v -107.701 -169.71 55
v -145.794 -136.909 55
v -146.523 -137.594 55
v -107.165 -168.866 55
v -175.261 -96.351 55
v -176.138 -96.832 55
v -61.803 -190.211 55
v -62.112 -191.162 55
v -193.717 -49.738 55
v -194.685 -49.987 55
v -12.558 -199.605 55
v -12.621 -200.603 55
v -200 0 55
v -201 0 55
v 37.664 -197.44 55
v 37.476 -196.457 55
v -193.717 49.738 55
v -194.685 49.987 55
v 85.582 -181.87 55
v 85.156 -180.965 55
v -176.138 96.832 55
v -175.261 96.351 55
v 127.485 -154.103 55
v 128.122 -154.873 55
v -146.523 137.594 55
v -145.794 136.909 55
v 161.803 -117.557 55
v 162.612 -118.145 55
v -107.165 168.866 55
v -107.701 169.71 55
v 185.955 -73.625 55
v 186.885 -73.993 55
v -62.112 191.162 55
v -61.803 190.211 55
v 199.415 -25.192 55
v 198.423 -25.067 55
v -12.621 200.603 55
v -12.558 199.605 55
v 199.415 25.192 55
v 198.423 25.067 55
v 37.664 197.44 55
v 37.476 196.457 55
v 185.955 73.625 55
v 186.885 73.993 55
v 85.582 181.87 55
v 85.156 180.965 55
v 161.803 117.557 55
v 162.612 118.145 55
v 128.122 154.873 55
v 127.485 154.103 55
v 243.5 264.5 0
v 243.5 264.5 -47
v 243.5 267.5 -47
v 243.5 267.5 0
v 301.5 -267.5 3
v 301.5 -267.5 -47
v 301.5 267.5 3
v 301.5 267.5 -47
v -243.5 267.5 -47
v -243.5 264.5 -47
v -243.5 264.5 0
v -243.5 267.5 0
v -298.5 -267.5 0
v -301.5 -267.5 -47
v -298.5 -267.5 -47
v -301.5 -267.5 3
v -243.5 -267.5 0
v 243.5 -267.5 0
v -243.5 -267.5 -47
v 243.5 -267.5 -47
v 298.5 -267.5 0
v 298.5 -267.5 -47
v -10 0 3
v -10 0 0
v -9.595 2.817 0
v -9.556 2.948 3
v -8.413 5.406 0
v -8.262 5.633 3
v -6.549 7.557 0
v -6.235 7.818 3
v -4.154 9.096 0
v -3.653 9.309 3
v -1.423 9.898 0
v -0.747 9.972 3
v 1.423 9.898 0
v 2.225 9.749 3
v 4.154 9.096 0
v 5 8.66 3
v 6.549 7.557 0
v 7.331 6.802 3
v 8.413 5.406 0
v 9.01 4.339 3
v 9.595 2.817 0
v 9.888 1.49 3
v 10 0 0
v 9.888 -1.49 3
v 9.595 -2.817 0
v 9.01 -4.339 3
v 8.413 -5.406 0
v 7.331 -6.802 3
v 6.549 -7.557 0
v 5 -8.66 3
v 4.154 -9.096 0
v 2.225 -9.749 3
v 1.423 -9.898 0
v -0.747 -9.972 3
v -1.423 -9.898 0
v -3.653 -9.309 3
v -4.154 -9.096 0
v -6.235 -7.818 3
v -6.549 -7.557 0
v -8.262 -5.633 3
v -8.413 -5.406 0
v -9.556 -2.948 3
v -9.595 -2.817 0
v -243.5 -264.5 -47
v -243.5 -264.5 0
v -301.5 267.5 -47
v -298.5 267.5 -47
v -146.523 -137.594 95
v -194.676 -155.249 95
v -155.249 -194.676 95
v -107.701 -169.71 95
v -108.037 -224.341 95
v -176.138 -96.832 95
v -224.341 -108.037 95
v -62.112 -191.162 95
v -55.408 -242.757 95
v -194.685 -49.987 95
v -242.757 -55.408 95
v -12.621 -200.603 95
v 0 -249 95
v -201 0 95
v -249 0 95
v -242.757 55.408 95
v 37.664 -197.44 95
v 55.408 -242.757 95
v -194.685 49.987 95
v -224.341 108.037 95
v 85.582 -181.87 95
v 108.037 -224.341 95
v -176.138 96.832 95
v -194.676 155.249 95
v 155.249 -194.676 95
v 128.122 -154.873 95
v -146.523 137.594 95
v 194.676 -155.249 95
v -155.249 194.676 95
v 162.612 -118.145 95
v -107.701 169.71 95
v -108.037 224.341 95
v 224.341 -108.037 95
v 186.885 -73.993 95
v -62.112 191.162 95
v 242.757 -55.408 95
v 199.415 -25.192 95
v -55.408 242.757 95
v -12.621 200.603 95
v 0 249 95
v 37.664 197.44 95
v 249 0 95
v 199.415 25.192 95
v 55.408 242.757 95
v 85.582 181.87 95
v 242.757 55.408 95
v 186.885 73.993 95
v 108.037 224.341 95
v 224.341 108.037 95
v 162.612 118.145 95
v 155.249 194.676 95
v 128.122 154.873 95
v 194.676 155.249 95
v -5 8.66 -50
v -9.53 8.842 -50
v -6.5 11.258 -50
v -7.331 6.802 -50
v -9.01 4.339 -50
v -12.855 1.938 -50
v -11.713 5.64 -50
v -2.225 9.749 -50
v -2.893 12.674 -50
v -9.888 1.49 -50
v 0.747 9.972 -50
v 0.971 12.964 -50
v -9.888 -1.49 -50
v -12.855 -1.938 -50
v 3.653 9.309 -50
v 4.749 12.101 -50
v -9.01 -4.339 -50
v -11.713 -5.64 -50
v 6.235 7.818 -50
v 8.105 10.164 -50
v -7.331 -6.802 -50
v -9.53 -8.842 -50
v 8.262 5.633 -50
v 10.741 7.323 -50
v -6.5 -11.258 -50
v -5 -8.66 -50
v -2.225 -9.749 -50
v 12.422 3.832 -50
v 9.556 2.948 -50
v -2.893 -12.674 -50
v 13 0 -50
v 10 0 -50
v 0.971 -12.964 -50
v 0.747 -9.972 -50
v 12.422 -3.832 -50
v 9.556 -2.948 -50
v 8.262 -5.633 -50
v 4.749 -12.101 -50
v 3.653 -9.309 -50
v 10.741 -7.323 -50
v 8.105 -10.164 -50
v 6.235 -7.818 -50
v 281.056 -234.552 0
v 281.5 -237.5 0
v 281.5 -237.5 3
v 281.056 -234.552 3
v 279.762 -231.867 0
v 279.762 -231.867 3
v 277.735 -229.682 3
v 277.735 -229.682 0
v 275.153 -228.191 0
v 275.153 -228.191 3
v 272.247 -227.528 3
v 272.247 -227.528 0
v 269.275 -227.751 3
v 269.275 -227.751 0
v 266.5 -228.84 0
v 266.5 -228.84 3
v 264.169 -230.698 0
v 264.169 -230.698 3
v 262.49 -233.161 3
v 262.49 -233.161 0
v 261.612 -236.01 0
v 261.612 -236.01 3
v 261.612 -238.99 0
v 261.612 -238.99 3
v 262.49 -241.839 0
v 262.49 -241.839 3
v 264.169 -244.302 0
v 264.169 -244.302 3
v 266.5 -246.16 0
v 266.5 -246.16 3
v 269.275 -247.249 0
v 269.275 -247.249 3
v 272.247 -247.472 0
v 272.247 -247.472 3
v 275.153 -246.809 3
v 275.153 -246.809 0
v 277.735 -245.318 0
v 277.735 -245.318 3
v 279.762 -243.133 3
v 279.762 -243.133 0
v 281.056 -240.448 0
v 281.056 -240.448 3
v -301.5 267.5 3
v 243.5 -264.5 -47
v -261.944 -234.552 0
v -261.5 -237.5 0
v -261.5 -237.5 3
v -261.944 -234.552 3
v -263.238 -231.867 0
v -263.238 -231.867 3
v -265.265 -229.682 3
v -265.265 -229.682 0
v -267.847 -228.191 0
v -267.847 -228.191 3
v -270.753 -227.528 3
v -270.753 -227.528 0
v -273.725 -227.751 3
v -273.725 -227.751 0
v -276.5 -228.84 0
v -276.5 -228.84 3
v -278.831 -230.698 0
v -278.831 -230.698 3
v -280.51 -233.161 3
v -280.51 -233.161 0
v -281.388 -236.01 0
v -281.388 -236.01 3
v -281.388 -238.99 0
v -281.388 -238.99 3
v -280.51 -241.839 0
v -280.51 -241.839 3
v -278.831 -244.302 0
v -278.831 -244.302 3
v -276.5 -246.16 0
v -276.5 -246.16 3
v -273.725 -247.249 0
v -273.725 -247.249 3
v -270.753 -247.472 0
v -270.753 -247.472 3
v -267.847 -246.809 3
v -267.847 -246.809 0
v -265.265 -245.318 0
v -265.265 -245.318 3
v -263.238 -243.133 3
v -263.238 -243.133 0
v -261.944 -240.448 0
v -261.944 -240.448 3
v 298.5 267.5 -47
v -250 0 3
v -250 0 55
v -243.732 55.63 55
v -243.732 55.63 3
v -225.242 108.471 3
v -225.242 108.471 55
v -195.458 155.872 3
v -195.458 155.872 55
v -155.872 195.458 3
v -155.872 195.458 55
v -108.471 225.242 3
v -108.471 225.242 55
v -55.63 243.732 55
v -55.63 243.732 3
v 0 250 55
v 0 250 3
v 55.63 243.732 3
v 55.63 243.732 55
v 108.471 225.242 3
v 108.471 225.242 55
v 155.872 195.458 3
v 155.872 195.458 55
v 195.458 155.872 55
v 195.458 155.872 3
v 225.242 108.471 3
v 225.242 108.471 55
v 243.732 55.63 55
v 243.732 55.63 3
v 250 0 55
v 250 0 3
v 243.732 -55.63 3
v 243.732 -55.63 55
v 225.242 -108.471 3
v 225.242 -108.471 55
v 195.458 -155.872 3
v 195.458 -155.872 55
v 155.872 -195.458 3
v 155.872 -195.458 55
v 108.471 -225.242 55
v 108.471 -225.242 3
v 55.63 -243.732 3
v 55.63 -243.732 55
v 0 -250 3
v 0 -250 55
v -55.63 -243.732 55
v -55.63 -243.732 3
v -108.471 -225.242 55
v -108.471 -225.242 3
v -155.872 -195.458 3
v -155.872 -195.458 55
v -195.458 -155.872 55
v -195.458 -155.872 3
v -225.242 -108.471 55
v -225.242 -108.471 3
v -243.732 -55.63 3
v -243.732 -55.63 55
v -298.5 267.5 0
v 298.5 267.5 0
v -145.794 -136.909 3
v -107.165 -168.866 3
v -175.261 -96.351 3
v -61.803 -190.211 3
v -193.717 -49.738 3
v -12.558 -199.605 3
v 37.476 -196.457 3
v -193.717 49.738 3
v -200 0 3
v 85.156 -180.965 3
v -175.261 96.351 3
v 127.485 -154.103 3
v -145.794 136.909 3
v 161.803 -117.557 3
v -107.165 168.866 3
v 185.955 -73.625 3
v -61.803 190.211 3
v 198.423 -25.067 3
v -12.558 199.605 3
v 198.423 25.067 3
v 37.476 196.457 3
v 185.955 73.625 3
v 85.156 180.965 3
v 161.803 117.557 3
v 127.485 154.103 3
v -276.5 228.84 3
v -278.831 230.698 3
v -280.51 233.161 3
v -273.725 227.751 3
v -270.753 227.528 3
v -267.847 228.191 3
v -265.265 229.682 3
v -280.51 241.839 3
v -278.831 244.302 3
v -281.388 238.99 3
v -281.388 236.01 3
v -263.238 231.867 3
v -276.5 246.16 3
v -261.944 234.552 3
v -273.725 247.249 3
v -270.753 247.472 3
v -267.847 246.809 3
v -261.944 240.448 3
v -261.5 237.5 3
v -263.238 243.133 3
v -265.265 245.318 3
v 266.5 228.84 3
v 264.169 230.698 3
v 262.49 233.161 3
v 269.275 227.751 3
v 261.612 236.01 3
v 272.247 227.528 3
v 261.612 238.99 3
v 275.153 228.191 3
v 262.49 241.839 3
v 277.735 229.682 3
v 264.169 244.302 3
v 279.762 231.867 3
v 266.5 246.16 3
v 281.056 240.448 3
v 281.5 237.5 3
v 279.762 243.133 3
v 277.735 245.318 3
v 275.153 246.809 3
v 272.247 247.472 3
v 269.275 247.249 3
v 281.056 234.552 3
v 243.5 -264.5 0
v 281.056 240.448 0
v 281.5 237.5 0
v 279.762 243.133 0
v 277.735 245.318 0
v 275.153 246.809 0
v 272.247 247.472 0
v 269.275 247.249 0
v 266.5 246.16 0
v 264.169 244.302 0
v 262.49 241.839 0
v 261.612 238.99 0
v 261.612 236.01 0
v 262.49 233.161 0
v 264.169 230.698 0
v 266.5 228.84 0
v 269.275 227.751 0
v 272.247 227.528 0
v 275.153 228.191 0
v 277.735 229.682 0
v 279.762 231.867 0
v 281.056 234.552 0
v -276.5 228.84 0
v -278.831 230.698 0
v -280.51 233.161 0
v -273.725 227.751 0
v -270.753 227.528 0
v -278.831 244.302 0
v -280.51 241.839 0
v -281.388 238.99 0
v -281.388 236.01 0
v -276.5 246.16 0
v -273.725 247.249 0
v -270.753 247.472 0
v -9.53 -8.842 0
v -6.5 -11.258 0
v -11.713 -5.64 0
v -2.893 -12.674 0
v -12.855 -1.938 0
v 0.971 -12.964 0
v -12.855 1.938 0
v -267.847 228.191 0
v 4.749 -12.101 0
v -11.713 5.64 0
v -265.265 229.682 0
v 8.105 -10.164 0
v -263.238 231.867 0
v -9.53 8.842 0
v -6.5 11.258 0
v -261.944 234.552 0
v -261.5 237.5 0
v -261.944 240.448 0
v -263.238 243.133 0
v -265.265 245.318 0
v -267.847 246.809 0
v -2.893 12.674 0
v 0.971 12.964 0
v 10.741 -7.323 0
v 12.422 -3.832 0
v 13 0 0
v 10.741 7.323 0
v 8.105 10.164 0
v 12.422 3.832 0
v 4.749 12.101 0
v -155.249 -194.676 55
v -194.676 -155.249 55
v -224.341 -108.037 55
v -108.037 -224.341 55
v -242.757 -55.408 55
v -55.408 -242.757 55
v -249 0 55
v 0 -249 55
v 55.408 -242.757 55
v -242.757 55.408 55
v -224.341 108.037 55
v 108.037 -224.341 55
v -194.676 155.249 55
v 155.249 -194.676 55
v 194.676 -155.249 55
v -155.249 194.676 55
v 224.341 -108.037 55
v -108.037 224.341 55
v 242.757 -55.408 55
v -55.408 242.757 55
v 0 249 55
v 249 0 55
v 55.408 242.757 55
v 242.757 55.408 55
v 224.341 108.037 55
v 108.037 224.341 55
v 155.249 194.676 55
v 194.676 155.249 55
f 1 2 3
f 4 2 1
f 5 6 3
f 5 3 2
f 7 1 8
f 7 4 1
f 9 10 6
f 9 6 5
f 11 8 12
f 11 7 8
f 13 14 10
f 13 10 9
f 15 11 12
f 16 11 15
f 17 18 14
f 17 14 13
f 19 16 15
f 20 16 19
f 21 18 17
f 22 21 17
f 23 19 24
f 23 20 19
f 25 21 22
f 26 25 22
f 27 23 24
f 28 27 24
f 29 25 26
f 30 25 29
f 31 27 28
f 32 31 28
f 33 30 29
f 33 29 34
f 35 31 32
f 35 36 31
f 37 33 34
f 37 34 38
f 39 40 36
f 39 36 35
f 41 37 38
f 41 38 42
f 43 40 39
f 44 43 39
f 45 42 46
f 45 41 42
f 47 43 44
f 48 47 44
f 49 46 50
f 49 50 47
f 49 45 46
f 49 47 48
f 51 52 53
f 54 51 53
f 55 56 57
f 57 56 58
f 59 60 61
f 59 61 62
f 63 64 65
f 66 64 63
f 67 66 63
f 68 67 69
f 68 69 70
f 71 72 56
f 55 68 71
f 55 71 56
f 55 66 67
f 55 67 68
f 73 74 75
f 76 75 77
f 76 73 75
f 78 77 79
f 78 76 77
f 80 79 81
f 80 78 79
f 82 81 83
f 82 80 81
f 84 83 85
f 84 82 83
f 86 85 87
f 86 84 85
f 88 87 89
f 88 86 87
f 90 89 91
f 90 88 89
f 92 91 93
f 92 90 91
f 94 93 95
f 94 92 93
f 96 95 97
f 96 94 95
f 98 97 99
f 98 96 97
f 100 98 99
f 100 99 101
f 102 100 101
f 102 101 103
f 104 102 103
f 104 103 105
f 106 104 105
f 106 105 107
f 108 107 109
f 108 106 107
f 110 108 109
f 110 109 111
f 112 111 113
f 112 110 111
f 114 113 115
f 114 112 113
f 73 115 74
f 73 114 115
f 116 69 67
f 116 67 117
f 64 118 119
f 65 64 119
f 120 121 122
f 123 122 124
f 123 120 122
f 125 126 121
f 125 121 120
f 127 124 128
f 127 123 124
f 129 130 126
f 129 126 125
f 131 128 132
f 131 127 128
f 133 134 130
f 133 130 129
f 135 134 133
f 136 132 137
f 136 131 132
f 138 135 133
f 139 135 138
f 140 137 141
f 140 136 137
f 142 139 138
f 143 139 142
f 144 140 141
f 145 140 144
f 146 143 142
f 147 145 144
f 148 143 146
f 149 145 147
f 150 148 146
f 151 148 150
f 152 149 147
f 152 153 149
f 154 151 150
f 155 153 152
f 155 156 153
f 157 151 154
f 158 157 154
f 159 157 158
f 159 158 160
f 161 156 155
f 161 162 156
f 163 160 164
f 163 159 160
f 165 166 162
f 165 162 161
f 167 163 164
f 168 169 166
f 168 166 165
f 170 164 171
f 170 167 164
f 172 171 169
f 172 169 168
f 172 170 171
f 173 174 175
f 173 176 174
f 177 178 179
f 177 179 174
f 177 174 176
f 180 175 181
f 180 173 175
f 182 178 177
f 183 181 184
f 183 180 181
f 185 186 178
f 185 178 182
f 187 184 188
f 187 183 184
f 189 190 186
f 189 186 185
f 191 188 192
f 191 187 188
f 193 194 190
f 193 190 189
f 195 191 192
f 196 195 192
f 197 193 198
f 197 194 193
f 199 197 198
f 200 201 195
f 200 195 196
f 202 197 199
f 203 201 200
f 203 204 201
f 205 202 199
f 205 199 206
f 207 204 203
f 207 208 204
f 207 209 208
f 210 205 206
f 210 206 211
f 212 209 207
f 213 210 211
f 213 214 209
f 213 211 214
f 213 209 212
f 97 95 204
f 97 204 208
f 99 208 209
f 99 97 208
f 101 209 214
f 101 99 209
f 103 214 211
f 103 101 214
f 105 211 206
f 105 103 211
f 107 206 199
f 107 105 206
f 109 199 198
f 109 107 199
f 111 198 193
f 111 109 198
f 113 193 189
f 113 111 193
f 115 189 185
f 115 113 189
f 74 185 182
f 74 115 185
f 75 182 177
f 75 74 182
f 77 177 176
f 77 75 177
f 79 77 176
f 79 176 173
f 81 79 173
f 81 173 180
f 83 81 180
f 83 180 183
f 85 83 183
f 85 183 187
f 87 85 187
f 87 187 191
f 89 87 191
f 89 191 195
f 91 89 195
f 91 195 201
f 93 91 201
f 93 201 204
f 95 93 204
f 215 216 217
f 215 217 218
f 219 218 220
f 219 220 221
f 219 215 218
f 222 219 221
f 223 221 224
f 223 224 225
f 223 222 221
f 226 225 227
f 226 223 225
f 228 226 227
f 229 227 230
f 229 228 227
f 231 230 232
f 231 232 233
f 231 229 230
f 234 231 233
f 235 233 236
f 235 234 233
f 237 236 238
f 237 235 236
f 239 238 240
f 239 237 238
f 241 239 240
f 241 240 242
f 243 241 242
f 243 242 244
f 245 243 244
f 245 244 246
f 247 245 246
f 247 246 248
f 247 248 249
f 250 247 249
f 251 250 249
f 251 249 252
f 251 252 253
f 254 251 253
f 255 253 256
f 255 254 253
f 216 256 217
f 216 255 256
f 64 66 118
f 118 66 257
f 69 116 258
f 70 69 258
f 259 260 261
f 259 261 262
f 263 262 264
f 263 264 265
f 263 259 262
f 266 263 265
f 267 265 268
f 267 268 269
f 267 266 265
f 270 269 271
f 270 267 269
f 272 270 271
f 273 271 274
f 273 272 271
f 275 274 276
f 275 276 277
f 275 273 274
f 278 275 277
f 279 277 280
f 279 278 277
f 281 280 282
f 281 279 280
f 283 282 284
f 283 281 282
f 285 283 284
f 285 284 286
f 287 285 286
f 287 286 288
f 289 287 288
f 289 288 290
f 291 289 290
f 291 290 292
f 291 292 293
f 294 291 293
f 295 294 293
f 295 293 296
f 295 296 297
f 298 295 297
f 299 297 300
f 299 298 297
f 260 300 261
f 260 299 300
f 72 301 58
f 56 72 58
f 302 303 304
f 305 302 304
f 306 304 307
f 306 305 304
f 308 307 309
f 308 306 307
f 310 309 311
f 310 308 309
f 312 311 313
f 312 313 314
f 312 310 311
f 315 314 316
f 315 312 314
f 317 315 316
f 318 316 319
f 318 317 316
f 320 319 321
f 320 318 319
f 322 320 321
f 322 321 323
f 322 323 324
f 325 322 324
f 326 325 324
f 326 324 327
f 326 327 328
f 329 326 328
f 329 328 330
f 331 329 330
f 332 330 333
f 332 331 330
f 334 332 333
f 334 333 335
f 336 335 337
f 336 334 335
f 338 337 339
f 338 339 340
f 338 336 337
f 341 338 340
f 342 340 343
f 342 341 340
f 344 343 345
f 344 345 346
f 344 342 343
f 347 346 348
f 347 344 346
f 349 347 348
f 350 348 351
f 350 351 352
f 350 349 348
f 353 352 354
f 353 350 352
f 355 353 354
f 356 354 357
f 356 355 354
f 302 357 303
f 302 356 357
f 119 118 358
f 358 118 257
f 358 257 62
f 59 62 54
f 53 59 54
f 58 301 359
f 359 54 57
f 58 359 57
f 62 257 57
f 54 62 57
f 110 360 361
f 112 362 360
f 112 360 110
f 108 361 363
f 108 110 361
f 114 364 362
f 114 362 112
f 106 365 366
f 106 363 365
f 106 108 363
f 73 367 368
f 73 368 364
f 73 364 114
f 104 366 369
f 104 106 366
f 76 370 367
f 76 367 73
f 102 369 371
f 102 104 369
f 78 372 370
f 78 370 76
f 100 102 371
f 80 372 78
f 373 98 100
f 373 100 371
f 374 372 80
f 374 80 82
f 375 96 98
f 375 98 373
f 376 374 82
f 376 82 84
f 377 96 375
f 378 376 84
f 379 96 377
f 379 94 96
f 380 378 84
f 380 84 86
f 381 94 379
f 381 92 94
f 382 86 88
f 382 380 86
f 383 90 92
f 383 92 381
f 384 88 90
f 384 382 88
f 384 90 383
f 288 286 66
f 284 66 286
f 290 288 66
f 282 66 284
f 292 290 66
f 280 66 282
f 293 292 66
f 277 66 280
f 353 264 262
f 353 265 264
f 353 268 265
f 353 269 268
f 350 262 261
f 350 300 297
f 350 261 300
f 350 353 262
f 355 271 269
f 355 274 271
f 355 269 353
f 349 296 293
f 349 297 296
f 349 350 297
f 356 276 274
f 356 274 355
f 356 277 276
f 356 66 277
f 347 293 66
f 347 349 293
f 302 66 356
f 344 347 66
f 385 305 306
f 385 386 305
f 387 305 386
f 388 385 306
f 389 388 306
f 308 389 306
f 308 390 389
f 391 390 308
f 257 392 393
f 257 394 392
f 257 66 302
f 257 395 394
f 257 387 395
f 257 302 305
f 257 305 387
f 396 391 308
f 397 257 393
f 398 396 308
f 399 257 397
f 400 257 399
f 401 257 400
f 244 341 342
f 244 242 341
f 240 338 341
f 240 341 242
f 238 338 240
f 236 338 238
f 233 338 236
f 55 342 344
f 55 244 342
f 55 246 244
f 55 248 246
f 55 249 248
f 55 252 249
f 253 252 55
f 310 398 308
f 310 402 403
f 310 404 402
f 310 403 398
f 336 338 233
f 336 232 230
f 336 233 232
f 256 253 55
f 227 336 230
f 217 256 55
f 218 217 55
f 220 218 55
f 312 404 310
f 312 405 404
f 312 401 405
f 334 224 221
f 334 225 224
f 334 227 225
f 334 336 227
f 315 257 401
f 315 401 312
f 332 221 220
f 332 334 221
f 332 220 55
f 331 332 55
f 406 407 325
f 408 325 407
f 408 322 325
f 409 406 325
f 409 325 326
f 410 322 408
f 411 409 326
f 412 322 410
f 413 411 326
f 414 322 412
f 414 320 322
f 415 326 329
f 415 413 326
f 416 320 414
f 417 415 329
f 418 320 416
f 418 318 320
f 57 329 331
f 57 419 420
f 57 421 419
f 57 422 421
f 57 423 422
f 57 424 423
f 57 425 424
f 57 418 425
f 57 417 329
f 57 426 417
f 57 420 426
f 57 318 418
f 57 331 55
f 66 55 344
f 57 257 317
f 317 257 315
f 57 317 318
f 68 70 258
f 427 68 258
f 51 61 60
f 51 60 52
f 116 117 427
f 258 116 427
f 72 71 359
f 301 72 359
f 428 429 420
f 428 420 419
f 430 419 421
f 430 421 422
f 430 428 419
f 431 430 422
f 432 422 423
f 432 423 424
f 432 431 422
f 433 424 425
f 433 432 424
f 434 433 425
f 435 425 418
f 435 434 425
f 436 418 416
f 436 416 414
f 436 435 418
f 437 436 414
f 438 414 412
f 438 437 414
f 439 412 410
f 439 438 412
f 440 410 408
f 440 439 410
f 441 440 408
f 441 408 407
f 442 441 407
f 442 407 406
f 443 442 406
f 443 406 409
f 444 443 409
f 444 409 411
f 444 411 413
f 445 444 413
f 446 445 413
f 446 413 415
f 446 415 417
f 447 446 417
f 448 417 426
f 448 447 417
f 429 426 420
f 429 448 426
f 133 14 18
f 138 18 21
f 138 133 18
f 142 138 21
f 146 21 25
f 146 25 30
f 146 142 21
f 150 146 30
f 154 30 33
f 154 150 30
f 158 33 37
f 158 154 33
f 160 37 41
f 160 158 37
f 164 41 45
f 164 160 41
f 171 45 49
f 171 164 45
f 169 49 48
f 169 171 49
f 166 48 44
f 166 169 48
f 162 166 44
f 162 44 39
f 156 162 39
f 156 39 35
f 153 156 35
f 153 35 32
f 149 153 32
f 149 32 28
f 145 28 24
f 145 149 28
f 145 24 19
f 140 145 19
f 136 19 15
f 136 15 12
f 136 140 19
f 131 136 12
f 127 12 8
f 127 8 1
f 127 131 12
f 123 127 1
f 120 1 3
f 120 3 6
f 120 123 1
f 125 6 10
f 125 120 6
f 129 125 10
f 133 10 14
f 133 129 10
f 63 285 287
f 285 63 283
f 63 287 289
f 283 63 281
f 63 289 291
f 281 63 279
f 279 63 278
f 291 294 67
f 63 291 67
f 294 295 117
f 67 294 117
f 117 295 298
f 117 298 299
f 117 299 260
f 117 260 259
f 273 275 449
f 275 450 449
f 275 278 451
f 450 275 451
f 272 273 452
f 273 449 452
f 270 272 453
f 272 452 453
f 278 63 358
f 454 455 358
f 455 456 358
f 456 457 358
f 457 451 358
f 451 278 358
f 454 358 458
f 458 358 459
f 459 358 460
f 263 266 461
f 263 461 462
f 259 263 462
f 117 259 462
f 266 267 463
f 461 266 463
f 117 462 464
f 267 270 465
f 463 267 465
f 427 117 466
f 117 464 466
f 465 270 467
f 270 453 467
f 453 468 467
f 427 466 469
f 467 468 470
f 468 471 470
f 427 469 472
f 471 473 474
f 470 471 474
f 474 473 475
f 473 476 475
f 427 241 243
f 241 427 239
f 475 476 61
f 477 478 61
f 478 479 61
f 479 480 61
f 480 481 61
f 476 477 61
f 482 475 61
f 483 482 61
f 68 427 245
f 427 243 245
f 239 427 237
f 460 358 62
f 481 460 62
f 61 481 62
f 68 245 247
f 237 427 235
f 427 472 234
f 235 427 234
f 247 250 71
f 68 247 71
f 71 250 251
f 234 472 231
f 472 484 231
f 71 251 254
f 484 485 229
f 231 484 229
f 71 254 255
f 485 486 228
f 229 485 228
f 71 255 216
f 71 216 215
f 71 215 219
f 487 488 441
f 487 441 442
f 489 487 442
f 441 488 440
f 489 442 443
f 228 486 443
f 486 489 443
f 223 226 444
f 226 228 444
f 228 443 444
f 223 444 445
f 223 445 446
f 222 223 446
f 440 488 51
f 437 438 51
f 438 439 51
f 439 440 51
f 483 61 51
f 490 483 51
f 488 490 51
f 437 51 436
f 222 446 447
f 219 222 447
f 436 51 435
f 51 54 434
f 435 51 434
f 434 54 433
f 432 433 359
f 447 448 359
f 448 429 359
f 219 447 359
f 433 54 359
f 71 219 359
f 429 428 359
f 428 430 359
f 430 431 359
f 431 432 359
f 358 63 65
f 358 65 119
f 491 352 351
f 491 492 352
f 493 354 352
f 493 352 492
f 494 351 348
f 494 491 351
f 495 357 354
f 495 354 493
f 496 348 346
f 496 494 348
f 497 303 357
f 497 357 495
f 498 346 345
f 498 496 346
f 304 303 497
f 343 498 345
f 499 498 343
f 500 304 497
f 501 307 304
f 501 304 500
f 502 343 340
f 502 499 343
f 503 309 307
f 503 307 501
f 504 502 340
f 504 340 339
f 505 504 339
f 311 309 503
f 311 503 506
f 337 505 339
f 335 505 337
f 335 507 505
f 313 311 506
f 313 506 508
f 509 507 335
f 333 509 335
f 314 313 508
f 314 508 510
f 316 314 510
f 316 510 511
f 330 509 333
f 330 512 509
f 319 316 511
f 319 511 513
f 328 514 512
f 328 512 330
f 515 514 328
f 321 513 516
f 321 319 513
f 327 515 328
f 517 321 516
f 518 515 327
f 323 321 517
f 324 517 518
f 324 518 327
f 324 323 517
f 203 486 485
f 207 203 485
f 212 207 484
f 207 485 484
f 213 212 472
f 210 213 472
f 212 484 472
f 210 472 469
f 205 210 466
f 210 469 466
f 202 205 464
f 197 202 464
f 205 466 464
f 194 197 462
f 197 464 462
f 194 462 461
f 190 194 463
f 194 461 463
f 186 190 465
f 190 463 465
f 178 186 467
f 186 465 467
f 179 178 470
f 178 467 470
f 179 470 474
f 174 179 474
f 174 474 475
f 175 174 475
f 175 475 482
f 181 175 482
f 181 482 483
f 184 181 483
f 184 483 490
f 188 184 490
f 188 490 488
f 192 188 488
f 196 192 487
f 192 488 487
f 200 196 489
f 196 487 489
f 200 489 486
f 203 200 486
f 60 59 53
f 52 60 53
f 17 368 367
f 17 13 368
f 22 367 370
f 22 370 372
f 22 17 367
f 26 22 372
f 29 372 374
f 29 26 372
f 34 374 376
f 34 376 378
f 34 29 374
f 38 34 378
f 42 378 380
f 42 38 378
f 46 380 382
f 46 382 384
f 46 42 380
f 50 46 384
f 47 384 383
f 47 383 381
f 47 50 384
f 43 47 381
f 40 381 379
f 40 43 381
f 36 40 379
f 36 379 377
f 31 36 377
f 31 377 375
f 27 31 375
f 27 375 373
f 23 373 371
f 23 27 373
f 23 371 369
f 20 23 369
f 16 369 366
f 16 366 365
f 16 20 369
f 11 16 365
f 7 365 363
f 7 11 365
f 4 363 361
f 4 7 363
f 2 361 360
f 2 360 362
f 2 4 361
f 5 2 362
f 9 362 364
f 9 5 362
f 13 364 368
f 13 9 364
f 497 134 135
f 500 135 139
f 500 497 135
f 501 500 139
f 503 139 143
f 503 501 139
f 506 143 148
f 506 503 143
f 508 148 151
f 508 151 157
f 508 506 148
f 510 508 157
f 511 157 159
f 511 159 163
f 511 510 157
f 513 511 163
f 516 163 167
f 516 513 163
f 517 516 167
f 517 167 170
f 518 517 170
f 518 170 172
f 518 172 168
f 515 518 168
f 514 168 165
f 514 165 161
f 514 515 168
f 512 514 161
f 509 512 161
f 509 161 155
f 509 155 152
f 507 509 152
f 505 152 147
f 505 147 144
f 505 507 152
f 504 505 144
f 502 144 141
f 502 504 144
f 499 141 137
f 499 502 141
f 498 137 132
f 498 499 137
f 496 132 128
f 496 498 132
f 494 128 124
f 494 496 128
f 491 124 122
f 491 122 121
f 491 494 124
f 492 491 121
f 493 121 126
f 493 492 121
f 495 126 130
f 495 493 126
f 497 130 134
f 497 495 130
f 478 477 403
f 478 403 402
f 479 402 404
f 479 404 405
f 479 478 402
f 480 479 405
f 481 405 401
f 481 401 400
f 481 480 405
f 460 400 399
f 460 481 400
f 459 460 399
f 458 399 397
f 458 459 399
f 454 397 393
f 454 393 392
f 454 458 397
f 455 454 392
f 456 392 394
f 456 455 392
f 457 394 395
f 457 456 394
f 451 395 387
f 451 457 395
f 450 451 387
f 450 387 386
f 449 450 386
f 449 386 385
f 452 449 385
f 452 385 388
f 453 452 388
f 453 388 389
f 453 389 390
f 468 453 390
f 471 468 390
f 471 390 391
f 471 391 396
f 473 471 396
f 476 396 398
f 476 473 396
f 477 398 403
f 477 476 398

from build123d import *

# Parameters (mm, degrees)
F2_W     = 603
F2_H     = 535
F2_R     = 10
F2_R_2   = 201
F3_DEPTH = 3
F4_W     = 3
F4_H     = 535
F4_W_2   = 487
F4_H_2   = 3
F5_DEPTH = 50
F6_R     = 13
F6_R_2   = 10
F7_DEPTH = 50


with BuildPart() as f1:
    # F0 (on Front) → F1 (revolve)
    with BuildSketch(Plane.XZ):
        Polygon((-250, 3), (-200, 3), (-200, 55), (-201, 55), (-201, 95), (-249, 95), (-249, 55), (-250, 55), align=None)
        Polygon((-10, 3), (-200, 3), (-250, 3), (-250, 0), (-10, 0), align=None)
    revolve(axis=Axis((0, 0, 187.921241), (0, 0, -1)))

    # F2 (on Top) → F3 (join)
    with BuildSketch(Plane.XY):
        Rectangle(F2_W, F2_H)
        with Locations((-271.5, -237.5)):
            Circle(F2_R, mode=Mode.SUBTRACT)
        with Locations((271.5, -237.5)):
            Circle(F2_R, mode=Mode.SUBTRACT)
        with Locations((-271.5, 237.5)):
            Circle(F2_R, mode=Mode.SUBTRACT)
        Circle(F2_R_2, mode=Mode.SUBTRACT)
        with Locations((271.5, 237.5)):
            Circle(F2_R, mode=Mode.SUBTRACT)
    extrude(amount=F3_DEPTH)

    # F4 (on face) → F5 (join)
    with BuildSketch(Plane.XY.offset(3)):
        with Locations((-300, 0)):
            Rectangle(F4_W, F4_H)
        with Locations((300, 0)):
            Rectangle(F4_W, F4_H)
        with Locations((0, -266)):
            Rectangle(F4_W_2, F4_H_2)
        with Locations((0, 266)):
            Rectangle(F4_W_2, F4_H_2)
    extrude(amount=-F5_DEPTH)

    # F6 (on face) → F7 (join)
    with BuildSketch(Plane(origin=(0, 0, 0), x_dir=(1, 0, 0), z_dir=(0, 0, -1))):
        Circle(F6_R)
        Circle(F6_R_2, mode=Mode.SUBTRACT)
    extrude(amount=F7_DEPTH)


solid = f1.part
